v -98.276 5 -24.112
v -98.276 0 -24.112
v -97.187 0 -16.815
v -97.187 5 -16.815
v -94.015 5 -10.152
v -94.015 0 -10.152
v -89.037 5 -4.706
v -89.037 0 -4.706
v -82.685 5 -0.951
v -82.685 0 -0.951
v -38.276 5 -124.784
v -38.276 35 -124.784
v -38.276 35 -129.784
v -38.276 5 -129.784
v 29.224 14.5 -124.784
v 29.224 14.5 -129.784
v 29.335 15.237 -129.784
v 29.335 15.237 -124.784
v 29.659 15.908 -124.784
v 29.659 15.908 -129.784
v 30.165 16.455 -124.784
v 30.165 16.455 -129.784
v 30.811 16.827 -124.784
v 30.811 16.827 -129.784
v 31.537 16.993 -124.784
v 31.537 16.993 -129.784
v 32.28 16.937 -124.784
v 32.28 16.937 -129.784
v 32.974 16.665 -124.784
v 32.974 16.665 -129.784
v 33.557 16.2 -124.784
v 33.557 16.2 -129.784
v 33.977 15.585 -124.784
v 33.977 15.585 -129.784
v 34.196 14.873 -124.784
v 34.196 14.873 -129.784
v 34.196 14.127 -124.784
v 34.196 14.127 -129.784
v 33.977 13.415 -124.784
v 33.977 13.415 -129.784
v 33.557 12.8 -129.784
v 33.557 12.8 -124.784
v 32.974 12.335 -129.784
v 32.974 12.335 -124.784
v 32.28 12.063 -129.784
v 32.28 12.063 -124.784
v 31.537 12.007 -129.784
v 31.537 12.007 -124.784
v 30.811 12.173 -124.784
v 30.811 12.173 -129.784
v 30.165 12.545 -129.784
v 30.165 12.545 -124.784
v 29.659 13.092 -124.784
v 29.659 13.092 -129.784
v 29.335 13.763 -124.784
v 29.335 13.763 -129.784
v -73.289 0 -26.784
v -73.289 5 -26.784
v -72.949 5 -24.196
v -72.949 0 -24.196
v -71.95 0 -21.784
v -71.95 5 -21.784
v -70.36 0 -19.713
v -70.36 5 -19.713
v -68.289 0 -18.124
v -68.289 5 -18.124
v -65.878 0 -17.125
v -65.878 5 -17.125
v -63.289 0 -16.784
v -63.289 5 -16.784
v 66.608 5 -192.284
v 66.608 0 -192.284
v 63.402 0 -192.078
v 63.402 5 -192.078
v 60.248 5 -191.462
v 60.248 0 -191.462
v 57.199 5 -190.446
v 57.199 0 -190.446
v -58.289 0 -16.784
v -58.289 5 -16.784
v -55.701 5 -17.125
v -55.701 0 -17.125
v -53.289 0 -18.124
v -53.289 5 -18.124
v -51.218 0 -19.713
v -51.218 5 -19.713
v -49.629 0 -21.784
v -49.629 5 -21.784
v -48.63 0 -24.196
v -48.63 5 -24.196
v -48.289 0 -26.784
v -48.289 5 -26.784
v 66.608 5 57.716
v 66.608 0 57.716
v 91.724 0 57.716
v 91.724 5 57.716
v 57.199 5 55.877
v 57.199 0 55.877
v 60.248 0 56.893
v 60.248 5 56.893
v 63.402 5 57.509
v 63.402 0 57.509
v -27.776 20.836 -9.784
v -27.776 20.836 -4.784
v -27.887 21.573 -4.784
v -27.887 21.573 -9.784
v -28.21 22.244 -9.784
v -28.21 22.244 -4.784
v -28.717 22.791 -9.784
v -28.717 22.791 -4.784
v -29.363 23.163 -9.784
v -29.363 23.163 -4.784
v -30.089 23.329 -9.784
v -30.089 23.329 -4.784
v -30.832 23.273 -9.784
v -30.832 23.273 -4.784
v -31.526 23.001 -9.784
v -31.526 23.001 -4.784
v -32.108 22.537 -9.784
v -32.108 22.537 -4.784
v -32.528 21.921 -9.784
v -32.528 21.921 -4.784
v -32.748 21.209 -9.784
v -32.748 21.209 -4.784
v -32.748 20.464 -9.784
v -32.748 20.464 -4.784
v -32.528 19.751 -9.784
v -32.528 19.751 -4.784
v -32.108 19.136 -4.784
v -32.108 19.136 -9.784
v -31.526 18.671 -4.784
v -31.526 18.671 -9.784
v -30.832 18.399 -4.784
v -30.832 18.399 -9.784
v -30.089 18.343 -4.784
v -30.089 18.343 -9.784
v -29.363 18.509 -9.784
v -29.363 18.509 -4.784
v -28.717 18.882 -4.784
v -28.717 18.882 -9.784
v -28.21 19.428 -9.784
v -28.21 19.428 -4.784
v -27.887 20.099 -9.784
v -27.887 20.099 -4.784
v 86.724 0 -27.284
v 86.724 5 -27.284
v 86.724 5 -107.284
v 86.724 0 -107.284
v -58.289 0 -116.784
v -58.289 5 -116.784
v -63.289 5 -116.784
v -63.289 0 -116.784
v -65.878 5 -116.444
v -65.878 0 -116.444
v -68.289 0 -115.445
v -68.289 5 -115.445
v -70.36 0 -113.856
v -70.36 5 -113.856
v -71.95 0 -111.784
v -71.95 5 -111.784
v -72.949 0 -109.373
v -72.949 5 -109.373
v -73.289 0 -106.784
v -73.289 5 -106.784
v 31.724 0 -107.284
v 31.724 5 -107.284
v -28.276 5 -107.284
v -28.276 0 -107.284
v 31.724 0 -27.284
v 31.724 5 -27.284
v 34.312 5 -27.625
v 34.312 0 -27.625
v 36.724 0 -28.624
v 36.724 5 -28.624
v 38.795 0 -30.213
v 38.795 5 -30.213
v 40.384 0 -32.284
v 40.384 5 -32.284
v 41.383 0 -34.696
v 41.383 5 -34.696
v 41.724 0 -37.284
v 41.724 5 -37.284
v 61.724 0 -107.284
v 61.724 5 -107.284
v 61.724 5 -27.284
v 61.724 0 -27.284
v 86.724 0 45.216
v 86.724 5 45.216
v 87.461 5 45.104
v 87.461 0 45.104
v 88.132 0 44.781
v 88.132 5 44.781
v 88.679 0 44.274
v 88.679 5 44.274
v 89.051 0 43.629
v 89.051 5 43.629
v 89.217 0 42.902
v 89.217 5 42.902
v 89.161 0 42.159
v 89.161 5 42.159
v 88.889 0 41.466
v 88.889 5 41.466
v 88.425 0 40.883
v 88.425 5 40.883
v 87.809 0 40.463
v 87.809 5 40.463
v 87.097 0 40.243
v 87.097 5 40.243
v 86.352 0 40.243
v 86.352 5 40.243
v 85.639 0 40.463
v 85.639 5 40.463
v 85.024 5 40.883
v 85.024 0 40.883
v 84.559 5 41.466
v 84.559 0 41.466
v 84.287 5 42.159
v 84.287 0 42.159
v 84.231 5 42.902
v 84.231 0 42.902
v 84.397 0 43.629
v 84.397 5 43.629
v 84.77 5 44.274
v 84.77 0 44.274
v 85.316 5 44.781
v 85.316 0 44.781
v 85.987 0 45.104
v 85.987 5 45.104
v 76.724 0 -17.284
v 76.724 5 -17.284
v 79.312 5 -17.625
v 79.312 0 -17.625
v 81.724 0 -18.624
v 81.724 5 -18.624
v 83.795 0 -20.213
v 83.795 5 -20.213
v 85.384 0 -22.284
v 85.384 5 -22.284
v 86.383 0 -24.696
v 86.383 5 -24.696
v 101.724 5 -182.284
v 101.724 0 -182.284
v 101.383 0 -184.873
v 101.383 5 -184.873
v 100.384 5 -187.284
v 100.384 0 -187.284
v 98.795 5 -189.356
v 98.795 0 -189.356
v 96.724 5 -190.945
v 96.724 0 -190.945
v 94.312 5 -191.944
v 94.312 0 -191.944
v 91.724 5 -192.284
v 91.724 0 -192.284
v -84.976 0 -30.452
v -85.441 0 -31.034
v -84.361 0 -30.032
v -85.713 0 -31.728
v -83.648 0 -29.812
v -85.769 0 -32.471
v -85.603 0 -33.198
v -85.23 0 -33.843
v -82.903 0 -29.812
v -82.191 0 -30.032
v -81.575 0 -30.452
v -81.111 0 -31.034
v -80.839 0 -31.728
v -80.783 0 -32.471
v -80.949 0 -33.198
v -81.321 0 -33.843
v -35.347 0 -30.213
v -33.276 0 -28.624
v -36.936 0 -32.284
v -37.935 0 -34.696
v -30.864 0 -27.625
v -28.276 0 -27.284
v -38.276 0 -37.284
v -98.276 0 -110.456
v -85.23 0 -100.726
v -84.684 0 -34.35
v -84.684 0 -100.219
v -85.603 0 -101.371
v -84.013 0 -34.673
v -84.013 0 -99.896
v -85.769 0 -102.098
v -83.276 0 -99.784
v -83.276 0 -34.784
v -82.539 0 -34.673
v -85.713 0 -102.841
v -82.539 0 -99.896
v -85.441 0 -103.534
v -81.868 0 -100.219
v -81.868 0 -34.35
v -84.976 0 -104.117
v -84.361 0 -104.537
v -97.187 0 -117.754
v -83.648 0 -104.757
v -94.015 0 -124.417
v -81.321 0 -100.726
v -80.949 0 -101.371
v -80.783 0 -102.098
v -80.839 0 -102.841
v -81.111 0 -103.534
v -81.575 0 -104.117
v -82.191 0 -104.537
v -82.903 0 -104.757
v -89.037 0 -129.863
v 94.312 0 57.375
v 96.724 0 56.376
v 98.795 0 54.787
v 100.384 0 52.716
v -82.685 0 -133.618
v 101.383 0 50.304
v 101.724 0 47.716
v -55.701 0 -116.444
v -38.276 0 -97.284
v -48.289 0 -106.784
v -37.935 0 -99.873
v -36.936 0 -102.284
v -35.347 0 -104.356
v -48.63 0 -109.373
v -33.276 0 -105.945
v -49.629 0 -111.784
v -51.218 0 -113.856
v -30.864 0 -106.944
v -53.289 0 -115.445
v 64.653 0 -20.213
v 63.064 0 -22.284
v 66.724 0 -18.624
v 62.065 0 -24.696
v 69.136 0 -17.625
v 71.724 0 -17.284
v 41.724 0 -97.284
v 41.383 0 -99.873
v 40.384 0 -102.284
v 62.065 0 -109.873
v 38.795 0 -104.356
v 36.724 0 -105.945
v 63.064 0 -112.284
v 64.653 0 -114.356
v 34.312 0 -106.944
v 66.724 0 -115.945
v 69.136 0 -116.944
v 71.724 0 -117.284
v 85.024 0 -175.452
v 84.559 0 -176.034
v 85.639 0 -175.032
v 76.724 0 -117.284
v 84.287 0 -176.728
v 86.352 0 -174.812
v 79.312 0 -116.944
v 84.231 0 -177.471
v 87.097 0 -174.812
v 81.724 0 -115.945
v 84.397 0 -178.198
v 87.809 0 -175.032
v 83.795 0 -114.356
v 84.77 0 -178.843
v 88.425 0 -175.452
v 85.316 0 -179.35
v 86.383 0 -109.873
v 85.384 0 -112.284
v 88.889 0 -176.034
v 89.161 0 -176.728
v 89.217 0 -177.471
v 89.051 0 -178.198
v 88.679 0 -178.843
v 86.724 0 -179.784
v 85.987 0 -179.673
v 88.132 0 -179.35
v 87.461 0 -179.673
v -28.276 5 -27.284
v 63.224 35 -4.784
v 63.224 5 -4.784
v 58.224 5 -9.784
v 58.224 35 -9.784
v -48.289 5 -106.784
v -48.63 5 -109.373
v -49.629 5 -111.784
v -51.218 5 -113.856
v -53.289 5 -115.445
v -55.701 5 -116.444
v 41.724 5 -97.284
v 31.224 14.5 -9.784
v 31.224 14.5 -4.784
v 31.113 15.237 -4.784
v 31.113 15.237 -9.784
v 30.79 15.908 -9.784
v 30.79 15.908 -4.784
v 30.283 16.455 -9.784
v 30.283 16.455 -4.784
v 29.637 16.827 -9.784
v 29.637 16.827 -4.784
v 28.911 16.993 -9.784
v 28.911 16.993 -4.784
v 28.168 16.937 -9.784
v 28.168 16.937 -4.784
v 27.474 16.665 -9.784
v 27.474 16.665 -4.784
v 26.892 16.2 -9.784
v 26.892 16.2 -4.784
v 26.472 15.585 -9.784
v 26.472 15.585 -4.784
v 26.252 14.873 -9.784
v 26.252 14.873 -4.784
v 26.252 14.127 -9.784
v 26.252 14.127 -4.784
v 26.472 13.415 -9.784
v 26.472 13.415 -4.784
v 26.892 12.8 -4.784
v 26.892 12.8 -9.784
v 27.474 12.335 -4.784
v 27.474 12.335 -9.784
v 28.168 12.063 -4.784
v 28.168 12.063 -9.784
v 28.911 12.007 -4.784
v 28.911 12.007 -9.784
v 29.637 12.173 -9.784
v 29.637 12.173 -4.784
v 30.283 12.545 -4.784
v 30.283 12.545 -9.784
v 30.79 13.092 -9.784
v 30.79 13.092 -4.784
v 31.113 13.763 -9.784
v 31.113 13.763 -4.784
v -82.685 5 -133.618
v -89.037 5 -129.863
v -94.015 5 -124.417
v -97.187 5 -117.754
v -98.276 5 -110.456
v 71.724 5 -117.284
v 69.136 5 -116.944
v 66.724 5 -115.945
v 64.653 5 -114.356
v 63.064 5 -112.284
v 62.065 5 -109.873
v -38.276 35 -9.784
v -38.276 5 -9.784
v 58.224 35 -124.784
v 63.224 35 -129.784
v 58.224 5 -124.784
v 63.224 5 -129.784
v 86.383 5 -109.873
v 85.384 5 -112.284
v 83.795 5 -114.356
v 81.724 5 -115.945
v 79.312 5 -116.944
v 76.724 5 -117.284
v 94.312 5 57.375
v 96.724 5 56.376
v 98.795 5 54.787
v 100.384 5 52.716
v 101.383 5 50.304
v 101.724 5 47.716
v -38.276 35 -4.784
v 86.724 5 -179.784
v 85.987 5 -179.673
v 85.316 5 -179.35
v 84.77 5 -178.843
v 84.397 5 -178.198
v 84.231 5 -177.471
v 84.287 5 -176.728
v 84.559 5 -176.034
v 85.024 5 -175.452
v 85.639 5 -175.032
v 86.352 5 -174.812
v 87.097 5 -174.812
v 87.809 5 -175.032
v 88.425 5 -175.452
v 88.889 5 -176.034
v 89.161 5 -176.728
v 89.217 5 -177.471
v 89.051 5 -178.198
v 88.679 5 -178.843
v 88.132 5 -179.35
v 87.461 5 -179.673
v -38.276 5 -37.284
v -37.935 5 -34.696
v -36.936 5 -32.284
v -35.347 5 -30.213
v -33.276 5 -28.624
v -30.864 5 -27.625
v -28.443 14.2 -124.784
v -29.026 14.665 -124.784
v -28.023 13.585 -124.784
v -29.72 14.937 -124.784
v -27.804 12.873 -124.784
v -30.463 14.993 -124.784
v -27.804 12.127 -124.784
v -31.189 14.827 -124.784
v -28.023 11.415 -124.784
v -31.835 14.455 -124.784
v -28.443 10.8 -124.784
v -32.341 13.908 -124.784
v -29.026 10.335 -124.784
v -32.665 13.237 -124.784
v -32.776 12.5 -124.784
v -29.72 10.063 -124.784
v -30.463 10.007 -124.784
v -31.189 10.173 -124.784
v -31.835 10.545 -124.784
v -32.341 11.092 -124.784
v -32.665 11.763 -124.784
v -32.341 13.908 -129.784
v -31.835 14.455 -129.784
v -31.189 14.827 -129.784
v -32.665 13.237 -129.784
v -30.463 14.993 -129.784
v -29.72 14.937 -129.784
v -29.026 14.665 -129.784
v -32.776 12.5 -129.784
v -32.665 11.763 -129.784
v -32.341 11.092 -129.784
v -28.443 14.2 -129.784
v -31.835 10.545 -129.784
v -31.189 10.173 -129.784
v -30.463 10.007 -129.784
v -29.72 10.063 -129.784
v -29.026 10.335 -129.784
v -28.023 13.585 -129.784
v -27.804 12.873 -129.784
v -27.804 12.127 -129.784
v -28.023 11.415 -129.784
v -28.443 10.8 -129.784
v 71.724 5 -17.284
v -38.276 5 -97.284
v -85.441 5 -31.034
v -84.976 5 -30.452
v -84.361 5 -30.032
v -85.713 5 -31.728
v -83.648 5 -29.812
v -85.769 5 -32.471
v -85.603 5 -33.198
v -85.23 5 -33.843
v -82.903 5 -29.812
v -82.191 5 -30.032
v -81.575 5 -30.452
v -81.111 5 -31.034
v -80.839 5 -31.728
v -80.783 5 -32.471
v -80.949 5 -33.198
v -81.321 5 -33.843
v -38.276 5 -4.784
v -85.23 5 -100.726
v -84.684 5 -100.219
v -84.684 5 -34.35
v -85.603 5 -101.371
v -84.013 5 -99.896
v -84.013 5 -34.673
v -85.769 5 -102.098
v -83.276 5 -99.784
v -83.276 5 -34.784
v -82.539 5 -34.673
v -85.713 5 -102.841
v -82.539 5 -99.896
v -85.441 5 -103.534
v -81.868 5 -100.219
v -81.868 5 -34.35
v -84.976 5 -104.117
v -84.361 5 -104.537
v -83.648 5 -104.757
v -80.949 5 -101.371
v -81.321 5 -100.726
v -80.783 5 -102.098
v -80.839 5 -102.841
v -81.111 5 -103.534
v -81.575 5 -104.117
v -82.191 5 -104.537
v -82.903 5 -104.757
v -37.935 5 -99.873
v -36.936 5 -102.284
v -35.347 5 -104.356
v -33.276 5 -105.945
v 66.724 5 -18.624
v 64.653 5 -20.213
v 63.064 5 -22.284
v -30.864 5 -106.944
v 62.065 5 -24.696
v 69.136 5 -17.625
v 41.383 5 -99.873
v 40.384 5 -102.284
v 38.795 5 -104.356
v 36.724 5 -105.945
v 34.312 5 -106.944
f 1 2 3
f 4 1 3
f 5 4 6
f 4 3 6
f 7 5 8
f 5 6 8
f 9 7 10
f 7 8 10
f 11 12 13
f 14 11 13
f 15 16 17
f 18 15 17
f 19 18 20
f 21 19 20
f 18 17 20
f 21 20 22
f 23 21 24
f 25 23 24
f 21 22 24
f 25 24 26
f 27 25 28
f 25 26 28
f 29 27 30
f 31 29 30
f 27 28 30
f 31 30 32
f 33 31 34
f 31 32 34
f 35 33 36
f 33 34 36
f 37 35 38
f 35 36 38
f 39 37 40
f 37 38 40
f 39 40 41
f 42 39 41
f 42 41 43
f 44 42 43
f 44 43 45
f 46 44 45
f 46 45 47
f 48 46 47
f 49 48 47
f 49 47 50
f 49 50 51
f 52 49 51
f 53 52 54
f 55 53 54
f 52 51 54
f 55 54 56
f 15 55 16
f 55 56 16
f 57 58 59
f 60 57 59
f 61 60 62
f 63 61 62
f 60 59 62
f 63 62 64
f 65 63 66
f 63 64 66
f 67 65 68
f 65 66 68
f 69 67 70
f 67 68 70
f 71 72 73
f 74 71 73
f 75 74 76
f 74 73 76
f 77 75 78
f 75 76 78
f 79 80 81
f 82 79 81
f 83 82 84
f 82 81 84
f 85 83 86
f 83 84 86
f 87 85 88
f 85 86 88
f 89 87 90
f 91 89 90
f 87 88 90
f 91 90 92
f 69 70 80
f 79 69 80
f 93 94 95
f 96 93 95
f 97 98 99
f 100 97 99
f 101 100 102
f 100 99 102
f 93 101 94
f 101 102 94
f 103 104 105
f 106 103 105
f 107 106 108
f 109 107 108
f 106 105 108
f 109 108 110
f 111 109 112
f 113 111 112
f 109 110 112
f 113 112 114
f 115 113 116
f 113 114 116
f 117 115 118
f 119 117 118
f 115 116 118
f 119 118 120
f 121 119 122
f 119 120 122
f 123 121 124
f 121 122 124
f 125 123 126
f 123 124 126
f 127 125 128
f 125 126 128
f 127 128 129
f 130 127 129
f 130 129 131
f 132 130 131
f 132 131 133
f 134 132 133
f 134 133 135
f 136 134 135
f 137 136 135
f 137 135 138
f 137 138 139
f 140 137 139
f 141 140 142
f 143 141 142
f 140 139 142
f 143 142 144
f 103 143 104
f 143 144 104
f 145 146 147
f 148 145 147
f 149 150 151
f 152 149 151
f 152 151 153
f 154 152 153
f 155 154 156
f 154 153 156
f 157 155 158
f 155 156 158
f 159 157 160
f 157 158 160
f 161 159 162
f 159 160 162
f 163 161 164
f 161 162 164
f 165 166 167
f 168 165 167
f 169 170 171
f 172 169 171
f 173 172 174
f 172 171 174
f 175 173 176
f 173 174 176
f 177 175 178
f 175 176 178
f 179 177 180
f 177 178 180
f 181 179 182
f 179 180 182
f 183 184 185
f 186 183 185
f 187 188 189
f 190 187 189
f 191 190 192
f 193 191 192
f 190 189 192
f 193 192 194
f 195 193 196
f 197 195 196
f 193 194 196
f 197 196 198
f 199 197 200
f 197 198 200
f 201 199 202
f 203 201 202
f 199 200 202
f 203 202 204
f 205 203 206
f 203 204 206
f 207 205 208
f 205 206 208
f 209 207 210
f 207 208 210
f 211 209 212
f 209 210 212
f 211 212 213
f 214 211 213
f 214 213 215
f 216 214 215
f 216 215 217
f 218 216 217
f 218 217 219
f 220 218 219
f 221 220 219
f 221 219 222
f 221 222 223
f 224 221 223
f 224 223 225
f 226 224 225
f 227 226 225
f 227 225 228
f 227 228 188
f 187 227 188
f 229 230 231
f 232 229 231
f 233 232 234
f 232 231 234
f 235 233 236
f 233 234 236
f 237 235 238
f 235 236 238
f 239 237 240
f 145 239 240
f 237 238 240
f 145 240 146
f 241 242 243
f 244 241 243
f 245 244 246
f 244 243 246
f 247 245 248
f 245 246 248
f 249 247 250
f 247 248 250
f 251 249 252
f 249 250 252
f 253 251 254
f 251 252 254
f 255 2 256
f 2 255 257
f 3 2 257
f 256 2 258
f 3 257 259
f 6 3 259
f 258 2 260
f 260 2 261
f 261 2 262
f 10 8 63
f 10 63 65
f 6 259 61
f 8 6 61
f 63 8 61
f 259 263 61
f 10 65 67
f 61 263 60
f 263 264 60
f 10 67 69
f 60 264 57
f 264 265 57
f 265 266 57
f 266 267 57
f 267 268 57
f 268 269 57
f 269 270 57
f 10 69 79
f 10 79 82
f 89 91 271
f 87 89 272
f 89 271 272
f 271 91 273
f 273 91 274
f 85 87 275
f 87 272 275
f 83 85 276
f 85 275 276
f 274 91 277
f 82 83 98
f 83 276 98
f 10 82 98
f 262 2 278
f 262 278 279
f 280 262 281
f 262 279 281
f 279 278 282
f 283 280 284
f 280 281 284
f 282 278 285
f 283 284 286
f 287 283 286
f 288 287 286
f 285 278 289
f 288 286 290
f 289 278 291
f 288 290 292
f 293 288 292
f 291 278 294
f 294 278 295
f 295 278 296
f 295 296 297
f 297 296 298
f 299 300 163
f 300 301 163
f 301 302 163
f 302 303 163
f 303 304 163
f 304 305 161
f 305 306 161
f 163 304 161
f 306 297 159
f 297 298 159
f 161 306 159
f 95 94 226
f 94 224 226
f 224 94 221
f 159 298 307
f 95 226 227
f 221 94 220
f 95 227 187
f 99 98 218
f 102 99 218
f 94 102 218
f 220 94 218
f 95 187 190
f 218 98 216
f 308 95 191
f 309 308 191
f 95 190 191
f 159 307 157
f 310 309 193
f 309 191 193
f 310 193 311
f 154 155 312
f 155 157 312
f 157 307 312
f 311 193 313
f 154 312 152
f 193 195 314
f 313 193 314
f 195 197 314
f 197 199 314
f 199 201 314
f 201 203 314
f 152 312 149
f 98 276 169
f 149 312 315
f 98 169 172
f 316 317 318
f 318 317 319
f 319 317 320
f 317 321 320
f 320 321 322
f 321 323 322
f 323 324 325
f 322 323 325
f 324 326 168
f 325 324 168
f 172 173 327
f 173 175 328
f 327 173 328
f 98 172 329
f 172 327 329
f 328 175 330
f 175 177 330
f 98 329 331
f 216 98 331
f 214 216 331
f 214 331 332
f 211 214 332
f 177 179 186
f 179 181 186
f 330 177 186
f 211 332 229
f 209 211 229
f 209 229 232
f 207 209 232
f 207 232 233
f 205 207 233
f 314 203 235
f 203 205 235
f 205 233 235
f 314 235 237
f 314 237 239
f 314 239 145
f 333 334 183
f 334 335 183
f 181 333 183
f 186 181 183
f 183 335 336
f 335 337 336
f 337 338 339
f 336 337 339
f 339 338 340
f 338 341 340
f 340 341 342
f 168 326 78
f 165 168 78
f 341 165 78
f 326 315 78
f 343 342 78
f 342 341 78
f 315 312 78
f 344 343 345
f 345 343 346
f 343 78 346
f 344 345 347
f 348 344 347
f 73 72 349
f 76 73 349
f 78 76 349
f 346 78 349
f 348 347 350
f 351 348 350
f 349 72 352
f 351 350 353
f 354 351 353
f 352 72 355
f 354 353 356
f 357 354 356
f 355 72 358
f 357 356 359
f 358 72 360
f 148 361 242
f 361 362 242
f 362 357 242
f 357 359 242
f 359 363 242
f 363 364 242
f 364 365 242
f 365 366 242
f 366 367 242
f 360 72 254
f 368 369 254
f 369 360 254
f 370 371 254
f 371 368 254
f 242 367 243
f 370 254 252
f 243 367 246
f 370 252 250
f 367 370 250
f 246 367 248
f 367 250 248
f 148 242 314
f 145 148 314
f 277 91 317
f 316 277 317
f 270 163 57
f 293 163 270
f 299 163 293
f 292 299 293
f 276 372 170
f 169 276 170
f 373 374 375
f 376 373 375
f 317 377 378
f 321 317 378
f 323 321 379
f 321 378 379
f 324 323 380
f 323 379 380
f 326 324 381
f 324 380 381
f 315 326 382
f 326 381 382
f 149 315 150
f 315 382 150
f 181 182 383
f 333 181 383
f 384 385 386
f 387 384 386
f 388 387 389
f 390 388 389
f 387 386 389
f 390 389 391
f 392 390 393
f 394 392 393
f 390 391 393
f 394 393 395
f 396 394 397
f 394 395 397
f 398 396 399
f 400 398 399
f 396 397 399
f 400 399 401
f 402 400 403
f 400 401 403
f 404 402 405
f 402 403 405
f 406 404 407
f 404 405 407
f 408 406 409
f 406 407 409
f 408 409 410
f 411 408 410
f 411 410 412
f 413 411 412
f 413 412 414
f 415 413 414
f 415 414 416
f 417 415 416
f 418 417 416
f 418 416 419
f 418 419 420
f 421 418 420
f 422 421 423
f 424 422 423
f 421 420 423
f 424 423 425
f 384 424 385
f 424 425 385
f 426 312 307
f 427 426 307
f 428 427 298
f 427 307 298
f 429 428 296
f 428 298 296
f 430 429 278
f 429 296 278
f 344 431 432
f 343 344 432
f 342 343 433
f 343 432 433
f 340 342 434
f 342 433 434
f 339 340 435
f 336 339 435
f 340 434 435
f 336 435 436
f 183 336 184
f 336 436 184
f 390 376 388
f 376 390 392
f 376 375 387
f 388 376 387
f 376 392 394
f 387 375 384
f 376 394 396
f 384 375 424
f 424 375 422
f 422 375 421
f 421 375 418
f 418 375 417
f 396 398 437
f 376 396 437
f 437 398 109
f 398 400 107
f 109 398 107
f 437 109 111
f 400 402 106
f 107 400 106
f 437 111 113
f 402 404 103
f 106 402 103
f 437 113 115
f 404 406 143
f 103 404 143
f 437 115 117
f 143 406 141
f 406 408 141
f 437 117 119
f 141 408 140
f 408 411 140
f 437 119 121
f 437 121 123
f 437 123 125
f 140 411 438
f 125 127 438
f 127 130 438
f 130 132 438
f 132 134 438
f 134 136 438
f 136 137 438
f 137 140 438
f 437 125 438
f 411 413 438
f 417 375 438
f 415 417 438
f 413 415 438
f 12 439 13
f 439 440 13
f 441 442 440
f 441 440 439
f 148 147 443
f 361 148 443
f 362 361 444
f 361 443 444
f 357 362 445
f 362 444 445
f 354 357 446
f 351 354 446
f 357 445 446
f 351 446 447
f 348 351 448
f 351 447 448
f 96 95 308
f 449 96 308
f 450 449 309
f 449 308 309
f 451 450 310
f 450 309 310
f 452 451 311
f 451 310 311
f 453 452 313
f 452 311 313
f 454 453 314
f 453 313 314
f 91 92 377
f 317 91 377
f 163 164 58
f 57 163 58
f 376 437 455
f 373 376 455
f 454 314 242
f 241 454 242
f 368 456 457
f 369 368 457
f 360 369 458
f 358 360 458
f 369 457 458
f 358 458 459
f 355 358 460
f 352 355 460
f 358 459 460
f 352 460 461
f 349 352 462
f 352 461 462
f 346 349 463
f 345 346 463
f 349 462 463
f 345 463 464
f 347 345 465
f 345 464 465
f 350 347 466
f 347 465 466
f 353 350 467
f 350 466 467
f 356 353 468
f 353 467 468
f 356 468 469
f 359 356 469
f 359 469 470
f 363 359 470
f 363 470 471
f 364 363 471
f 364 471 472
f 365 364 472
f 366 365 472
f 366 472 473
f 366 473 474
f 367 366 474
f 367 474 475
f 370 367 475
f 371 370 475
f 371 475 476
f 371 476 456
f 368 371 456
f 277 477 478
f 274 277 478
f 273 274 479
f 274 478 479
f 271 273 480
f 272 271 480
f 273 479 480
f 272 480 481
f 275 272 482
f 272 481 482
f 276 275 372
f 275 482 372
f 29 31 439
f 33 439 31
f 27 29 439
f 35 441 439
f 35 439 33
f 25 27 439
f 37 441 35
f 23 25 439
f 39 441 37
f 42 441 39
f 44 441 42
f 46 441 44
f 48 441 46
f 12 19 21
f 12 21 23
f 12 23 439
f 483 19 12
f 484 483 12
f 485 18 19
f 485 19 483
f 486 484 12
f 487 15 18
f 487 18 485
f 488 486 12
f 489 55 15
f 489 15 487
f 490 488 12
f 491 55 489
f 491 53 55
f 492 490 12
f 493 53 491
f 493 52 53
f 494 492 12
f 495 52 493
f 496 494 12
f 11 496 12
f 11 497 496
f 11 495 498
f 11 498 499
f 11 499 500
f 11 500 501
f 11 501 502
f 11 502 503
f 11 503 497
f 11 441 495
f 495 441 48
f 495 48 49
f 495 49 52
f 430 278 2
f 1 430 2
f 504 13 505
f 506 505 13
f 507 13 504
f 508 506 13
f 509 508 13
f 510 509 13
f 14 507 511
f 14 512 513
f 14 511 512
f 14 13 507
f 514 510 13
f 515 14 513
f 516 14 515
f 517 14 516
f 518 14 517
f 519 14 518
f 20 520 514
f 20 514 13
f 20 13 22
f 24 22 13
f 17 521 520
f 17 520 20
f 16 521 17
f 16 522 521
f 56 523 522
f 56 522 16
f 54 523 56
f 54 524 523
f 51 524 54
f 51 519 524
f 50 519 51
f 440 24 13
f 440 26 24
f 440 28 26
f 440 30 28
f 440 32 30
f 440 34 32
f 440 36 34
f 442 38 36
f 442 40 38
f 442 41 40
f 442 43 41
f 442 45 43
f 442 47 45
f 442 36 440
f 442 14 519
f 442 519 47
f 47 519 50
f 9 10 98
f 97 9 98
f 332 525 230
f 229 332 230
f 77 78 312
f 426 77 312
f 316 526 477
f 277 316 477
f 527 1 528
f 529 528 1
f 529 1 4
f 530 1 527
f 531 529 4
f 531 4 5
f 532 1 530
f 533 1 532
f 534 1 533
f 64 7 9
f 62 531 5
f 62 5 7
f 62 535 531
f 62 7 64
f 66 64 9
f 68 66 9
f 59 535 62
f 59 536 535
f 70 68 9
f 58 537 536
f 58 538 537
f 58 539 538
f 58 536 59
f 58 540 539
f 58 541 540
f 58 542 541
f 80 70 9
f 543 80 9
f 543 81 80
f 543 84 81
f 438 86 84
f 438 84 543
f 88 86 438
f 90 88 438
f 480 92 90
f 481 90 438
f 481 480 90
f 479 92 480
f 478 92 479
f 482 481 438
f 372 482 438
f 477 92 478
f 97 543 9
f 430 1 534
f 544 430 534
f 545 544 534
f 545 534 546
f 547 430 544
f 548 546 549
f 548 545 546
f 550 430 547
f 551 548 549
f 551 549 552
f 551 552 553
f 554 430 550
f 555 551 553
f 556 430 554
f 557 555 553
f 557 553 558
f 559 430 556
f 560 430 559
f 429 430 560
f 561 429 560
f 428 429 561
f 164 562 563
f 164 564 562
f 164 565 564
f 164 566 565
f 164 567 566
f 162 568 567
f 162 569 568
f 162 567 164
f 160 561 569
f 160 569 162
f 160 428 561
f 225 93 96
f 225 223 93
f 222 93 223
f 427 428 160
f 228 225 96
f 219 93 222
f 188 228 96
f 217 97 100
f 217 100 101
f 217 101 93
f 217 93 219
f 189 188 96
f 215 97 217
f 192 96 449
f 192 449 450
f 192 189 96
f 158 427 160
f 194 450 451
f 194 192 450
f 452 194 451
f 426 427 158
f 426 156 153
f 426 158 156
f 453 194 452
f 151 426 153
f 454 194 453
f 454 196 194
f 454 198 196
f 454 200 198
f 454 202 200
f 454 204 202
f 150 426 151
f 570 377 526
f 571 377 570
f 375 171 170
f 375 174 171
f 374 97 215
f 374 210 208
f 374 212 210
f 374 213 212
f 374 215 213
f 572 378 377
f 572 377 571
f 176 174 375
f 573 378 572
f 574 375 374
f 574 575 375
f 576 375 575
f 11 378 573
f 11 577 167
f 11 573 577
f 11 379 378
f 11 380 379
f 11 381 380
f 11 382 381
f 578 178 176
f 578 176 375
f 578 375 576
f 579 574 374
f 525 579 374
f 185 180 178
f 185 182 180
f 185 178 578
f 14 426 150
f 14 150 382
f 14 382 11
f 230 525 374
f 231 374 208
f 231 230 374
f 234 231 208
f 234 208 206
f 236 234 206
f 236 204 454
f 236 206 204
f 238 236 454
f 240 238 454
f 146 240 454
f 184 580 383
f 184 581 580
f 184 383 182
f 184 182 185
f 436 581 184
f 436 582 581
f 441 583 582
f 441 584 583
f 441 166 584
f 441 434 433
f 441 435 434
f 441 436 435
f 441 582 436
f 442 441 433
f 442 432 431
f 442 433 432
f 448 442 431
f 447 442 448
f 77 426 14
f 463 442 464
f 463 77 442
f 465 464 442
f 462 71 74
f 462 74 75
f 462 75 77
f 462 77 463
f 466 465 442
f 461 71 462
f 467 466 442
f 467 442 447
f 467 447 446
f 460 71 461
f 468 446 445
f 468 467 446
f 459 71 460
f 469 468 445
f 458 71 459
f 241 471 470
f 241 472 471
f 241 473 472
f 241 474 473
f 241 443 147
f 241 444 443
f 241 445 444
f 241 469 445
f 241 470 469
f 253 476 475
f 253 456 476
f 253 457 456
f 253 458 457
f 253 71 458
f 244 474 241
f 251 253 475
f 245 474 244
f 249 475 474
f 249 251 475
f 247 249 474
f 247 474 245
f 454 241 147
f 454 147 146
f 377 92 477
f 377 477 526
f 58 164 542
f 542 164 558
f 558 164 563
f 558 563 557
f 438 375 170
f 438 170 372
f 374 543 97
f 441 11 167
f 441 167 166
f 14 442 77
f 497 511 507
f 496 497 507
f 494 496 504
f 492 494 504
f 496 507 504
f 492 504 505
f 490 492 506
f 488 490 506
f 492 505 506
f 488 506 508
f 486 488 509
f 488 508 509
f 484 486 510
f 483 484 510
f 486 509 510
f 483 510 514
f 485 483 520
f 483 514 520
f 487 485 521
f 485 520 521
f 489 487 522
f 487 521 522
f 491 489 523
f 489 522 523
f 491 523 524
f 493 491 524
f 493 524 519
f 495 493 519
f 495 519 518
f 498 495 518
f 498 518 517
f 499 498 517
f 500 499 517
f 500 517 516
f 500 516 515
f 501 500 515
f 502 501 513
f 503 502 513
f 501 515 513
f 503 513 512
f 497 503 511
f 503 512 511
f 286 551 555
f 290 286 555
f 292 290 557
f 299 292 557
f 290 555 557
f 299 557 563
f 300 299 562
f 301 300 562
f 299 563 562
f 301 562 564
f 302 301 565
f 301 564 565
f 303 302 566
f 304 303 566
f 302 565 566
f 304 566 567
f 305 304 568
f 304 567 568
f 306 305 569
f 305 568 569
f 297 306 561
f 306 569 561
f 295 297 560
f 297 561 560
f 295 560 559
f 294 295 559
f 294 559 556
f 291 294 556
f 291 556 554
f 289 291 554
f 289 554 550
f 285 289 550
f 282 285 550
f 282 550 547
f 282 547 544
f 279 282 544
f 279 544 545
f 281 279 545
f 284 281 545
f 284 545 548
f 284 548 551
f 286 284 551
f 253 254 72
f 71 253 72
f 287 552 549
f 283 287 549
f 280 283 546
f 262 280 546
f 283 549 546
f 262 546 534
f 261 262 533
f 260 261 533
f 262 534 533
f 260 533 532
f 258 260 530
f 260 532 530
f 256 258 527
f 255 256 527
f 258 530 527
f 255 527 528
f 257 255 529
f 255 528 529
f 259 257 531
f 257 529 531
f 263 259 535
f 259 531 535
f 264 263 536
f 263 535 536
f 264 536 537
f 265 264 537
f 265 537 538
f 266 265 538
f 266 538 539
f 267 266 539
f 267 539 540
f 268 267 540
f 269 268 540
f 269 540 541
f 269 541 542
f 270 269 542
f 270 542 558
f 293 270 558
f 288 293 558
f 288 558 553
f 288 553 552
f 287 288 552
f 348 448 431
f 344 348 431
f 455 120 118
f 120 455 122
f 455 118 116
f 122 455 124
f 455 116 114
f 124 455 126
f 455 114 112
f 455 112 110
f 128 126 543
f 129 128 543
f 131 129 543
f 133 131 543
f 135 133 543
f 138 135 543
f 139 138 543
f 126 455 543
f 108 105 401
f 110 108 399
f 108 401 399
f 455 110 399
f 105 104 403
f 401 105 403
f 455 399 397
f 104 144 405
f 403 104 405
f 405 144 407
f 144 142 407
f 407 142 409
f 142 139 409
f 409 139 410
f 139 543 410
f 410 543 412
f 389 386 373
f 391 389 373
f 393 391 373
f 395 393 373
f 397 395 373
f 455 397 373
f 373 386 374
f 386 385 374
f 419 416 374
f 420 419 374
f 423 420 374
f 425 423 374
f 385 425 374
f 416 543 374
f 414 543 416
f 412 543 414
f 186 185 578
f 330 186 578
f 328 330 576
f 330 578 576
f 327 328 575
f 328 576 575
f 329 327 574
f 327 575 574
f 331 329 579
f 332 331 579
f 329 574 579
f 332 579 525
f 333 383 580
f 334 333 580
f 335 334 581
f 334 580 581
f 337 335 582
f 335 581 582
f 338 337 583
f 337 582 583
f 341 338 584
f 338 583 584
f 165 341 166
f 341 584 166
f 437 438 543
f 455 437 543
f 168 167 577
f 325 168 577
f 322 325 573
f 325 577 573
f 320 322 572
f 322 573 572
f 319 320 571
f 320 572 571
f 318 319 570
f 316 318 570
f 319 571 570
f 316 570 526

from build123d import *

# Parameters (mm, degrees)
RESSALTO_EXTRUS_O1_DEPTH = 5
ESBO_O2_R                = 2.5
CORTE_EXTRUS_O1_DEPTH    = 218.591641723
RESSALTO_EXTRUS_O2_DEPTH = 30
ESBO_O5_R                = 2.5
CORTE_EXTRUS_O2_DEPTH    = 5
ESBO_O6_R                = 2.5
CORTE_EXTRUS_O3_DEPTH    = 5
CORTE_EXTRUS_O4_DEPTH    = 10


with BuildPart() as part:
    # Esboço1 → Ressalto-extrusão1 (new body)
    with BuildSketch(Plane(origin=(0, 0, 0), x_dir=(1, 0, 0), z_dir=(0, 1, 0))):
        with BuildLine():
            Line((66.608430389, -57.715517241), (91.724137931, -57.715517241))
            ThreePointArc((91.724137931, -57.715517241), (98.795205743, -54.786585053), (101.724137931, -47.715517241))
            Line((101.724137931, -47.715517241), (101.724137931, 182.284482759))
            ThreePointArc((101.724137931, 182.284482759), (98.795205743, 189.35555057), (91.724137931, 192.284482759))
            Line((91.724137931, 192.284482759), (66.608430389, 192.284482759))
            ThreePointArc((66.608430389, 192.284482759), (61.814768465, 191.820595029), (57.199004215, 190.446147187))
            Line((57.199004215, 190.446147187), (-82.685288243, 133.618153375))
            ThreePointArc((-82.685288243, 133.618153375), (-94.015144293, 124.416509464), (-98.275862069, 110.456488947))
            Line((-98.275862069, 110.456488947), (-98.275862069, 24.11247657))
            ThreePointArc((-98.275862069, 24.11247657), (-94.015144293, 10.152456053), (-82.685288243, 0.950812142))
            Line((-82.685288243, 0.950812142), (57.199004215, -55.877181669))
            ThreePointArc((57.199004215, -55.877181669), (61.814768465, -57.251629512), (66.608430389, -57.715517241))
        make_face()
    extrude(amount=RESSALTO_EXTRUS_O1_DEPTH)

    # Esboço2 → Corte-extrusão1 (cut, through all)
    with BuildSketch(Plane(origin=(0, 5, 0), x_dir=(1, 0, 0), z_dir=(0, 1, 0))):
        with Locations(Location((-83.275862069, 102.284482759, 0), (0, 0, 270))):
            Circle(ESBO_O2_R)
        with Locations(Location((86.724137931, 177.284482759, 0), (0, 0, 90))):
            Circle(ESBO_O2_R)
        with Locations(Location((86.724137931, -42.715517241, 0), (0, 0, 270))):
            Circle(ESBO_O2_R)
        with Locations(Location((-83.275862069, 32.284482759, 0), (0, 0, 90))):
            Circle(ESBO_O2_R)
        with BuildLine():
            Line((31.724137931, 107.284482759), (-28.275862069, 107.284482759))
            ThreePointArc((-28.275862069, 107.284482759), (-35.346929881, 104.35555057), (-38.275862069, 97.284482759))
            Line((-38.275862069, 97.284482759), (-38.275862069, 37.284482759))
            ThreePointArc((-38.275862069, 37.284482759), (-35.346929881, 30.213414947), (-28.275862069, 27.284482759))
            Line((-28.275862069, 27.284482759), (31.724137931, 27.284482759))
            ThreePointArc((31.724137931, 27.284482759), (38.795205743, 30.213414947), (41.724137931, 37.284482759))
            Line((41.724137931, 37.284482759), (41.724137931, 97.284482759))
            ThreePointArc((41.724137931, 97.284482759), (38.795205743, 104.35555057), (31.724137931, 107.284482759))
        make_face()
    extrude(amount=-CORTE_EXTRUS_O1_DEPTH, mode=Mode.SUBTRACT)

    # Esboço4 → Ressalto-extrusão2 (add)
    with BuildSketch(Plane(origin=(0, 5, 0), x_dir=(1, 0, 0), z_dir=(0, 1, 0))):
        Polygon((58.224137931, 9.784482759), (-38.275862069, 9.784482759), (-38.275862069, 4.784482759), (63.224137931, 4.784482759), align=None)
        Polygon((58.224137931, 124.784482759), (-38.275862069, 124.784482759), (-38.275862069, 129.784482759), (63.224137931, 129.784482759), align=None)
    extrude(amount=RESSALTO_EXTRUS_O2_DEPTH)

    # Esboço5 → Corte-extrusão2 (cut)
    with BuildSketch(Plane.XY.offset(-4.784482759)):
        with Locations((-30.275862069, 20.836178243)):
            Circle(ESBO_O5_R)
        with Locations((28.724137931, 14.5)):
            Circle(ESBO_O5_R)
    extrude(amount=-CORTE_EXTRUS_O2_DEPTH, mode=Mode.SUBTRACT)

    # Esboço6 → Corte-extrusão3 (cut)
    with BuildSketch(Plane(origin=(0, 0, -129.784482759), x_dir=(-1, 0, 0), z_dir=(0, 0, -1))):
        with Locations((-31.724137931, 14.5)):
            Circle(ESBO_O6_R)
        with Locations((30.275862069, 12.5)):
            Circle(ESBO_O6_R)
    extrude(amount=-CORTE_EXTRUS_O3_DEPTH, mode=Mode.SUBTRACT)

    # Esboço7 → Corte-extrusão4 (cut)
    with BuildSketch(Plane(origin=(0, 5, 0), x_dir=(1, 0, 0), z_dir=(0, 1, 0))):
        with BuildLine():
            Line((76.724137931, 117.284482759), (71.724137931, 117.284482759))
            ThreePointArc((71.724137931, 117.284482759), (64.653070119, 114.35555057), (61.724137931, 107.284482759))
            Line((61.724137931, 107.284482759), (61.724137931, 27.284482759))
            ThreePointArc((61.724137931, 27.284482759), (64.653070119, 20.213414947), (71.724137931, 17.284482759))
            Line((71.724137931, 17.284482759), (76.724137931, 17.284482759))
            ThreePointArc((76.724137931, 17.284482759), (83.795205743, 20.213414947), (86.724137931, 27.284482759))
            Line((86.724137931, 27.284482759), (86.724137931, 107.284482759))
            ThreePointArc((86.724137931, 107.284482759), (83.795205743, 114.35555057), (76.724137931, 117.284482759))
        make_face()
        with BuildLine():
            Line((-58.289420658, 116.784482759), (-63.289420658, 116.784482759))
            ThreePointArc((-63.289420658, 116.784482759), (-70.36048847, 113.85555057), (-73.289420658, 106.784482759))
            Line((-73.289420658, 106.784482759), (-73.289420658, 26.784482759))
            ThreePointArc((-73.289420658, 26.784482759), (-70.36048847, 19.713414947), (-63.289420658, 16.784482759))
            Line((-63.289420658, 16.784482759), (-58.289420658, 16.784482759))
            ThreePointArc((-58.289420658, 16.784482759), (-51.218352846, 19.713414947), (-48.289420658, 26.784482759))
            Line((-48.289420658, 26.784482759), (-48.289420658, 106.784482759))
            ThreePointArc((-48.289420658, 106.784482759), (-51.218352846, 113.85555057), (-58.289420658, 116.784482759))
        make_face()
    extrude(amount=-CORTE_EXTRUS_O4_DEPTH, mode=Mode.SUBTRACT)


solid = part.part
